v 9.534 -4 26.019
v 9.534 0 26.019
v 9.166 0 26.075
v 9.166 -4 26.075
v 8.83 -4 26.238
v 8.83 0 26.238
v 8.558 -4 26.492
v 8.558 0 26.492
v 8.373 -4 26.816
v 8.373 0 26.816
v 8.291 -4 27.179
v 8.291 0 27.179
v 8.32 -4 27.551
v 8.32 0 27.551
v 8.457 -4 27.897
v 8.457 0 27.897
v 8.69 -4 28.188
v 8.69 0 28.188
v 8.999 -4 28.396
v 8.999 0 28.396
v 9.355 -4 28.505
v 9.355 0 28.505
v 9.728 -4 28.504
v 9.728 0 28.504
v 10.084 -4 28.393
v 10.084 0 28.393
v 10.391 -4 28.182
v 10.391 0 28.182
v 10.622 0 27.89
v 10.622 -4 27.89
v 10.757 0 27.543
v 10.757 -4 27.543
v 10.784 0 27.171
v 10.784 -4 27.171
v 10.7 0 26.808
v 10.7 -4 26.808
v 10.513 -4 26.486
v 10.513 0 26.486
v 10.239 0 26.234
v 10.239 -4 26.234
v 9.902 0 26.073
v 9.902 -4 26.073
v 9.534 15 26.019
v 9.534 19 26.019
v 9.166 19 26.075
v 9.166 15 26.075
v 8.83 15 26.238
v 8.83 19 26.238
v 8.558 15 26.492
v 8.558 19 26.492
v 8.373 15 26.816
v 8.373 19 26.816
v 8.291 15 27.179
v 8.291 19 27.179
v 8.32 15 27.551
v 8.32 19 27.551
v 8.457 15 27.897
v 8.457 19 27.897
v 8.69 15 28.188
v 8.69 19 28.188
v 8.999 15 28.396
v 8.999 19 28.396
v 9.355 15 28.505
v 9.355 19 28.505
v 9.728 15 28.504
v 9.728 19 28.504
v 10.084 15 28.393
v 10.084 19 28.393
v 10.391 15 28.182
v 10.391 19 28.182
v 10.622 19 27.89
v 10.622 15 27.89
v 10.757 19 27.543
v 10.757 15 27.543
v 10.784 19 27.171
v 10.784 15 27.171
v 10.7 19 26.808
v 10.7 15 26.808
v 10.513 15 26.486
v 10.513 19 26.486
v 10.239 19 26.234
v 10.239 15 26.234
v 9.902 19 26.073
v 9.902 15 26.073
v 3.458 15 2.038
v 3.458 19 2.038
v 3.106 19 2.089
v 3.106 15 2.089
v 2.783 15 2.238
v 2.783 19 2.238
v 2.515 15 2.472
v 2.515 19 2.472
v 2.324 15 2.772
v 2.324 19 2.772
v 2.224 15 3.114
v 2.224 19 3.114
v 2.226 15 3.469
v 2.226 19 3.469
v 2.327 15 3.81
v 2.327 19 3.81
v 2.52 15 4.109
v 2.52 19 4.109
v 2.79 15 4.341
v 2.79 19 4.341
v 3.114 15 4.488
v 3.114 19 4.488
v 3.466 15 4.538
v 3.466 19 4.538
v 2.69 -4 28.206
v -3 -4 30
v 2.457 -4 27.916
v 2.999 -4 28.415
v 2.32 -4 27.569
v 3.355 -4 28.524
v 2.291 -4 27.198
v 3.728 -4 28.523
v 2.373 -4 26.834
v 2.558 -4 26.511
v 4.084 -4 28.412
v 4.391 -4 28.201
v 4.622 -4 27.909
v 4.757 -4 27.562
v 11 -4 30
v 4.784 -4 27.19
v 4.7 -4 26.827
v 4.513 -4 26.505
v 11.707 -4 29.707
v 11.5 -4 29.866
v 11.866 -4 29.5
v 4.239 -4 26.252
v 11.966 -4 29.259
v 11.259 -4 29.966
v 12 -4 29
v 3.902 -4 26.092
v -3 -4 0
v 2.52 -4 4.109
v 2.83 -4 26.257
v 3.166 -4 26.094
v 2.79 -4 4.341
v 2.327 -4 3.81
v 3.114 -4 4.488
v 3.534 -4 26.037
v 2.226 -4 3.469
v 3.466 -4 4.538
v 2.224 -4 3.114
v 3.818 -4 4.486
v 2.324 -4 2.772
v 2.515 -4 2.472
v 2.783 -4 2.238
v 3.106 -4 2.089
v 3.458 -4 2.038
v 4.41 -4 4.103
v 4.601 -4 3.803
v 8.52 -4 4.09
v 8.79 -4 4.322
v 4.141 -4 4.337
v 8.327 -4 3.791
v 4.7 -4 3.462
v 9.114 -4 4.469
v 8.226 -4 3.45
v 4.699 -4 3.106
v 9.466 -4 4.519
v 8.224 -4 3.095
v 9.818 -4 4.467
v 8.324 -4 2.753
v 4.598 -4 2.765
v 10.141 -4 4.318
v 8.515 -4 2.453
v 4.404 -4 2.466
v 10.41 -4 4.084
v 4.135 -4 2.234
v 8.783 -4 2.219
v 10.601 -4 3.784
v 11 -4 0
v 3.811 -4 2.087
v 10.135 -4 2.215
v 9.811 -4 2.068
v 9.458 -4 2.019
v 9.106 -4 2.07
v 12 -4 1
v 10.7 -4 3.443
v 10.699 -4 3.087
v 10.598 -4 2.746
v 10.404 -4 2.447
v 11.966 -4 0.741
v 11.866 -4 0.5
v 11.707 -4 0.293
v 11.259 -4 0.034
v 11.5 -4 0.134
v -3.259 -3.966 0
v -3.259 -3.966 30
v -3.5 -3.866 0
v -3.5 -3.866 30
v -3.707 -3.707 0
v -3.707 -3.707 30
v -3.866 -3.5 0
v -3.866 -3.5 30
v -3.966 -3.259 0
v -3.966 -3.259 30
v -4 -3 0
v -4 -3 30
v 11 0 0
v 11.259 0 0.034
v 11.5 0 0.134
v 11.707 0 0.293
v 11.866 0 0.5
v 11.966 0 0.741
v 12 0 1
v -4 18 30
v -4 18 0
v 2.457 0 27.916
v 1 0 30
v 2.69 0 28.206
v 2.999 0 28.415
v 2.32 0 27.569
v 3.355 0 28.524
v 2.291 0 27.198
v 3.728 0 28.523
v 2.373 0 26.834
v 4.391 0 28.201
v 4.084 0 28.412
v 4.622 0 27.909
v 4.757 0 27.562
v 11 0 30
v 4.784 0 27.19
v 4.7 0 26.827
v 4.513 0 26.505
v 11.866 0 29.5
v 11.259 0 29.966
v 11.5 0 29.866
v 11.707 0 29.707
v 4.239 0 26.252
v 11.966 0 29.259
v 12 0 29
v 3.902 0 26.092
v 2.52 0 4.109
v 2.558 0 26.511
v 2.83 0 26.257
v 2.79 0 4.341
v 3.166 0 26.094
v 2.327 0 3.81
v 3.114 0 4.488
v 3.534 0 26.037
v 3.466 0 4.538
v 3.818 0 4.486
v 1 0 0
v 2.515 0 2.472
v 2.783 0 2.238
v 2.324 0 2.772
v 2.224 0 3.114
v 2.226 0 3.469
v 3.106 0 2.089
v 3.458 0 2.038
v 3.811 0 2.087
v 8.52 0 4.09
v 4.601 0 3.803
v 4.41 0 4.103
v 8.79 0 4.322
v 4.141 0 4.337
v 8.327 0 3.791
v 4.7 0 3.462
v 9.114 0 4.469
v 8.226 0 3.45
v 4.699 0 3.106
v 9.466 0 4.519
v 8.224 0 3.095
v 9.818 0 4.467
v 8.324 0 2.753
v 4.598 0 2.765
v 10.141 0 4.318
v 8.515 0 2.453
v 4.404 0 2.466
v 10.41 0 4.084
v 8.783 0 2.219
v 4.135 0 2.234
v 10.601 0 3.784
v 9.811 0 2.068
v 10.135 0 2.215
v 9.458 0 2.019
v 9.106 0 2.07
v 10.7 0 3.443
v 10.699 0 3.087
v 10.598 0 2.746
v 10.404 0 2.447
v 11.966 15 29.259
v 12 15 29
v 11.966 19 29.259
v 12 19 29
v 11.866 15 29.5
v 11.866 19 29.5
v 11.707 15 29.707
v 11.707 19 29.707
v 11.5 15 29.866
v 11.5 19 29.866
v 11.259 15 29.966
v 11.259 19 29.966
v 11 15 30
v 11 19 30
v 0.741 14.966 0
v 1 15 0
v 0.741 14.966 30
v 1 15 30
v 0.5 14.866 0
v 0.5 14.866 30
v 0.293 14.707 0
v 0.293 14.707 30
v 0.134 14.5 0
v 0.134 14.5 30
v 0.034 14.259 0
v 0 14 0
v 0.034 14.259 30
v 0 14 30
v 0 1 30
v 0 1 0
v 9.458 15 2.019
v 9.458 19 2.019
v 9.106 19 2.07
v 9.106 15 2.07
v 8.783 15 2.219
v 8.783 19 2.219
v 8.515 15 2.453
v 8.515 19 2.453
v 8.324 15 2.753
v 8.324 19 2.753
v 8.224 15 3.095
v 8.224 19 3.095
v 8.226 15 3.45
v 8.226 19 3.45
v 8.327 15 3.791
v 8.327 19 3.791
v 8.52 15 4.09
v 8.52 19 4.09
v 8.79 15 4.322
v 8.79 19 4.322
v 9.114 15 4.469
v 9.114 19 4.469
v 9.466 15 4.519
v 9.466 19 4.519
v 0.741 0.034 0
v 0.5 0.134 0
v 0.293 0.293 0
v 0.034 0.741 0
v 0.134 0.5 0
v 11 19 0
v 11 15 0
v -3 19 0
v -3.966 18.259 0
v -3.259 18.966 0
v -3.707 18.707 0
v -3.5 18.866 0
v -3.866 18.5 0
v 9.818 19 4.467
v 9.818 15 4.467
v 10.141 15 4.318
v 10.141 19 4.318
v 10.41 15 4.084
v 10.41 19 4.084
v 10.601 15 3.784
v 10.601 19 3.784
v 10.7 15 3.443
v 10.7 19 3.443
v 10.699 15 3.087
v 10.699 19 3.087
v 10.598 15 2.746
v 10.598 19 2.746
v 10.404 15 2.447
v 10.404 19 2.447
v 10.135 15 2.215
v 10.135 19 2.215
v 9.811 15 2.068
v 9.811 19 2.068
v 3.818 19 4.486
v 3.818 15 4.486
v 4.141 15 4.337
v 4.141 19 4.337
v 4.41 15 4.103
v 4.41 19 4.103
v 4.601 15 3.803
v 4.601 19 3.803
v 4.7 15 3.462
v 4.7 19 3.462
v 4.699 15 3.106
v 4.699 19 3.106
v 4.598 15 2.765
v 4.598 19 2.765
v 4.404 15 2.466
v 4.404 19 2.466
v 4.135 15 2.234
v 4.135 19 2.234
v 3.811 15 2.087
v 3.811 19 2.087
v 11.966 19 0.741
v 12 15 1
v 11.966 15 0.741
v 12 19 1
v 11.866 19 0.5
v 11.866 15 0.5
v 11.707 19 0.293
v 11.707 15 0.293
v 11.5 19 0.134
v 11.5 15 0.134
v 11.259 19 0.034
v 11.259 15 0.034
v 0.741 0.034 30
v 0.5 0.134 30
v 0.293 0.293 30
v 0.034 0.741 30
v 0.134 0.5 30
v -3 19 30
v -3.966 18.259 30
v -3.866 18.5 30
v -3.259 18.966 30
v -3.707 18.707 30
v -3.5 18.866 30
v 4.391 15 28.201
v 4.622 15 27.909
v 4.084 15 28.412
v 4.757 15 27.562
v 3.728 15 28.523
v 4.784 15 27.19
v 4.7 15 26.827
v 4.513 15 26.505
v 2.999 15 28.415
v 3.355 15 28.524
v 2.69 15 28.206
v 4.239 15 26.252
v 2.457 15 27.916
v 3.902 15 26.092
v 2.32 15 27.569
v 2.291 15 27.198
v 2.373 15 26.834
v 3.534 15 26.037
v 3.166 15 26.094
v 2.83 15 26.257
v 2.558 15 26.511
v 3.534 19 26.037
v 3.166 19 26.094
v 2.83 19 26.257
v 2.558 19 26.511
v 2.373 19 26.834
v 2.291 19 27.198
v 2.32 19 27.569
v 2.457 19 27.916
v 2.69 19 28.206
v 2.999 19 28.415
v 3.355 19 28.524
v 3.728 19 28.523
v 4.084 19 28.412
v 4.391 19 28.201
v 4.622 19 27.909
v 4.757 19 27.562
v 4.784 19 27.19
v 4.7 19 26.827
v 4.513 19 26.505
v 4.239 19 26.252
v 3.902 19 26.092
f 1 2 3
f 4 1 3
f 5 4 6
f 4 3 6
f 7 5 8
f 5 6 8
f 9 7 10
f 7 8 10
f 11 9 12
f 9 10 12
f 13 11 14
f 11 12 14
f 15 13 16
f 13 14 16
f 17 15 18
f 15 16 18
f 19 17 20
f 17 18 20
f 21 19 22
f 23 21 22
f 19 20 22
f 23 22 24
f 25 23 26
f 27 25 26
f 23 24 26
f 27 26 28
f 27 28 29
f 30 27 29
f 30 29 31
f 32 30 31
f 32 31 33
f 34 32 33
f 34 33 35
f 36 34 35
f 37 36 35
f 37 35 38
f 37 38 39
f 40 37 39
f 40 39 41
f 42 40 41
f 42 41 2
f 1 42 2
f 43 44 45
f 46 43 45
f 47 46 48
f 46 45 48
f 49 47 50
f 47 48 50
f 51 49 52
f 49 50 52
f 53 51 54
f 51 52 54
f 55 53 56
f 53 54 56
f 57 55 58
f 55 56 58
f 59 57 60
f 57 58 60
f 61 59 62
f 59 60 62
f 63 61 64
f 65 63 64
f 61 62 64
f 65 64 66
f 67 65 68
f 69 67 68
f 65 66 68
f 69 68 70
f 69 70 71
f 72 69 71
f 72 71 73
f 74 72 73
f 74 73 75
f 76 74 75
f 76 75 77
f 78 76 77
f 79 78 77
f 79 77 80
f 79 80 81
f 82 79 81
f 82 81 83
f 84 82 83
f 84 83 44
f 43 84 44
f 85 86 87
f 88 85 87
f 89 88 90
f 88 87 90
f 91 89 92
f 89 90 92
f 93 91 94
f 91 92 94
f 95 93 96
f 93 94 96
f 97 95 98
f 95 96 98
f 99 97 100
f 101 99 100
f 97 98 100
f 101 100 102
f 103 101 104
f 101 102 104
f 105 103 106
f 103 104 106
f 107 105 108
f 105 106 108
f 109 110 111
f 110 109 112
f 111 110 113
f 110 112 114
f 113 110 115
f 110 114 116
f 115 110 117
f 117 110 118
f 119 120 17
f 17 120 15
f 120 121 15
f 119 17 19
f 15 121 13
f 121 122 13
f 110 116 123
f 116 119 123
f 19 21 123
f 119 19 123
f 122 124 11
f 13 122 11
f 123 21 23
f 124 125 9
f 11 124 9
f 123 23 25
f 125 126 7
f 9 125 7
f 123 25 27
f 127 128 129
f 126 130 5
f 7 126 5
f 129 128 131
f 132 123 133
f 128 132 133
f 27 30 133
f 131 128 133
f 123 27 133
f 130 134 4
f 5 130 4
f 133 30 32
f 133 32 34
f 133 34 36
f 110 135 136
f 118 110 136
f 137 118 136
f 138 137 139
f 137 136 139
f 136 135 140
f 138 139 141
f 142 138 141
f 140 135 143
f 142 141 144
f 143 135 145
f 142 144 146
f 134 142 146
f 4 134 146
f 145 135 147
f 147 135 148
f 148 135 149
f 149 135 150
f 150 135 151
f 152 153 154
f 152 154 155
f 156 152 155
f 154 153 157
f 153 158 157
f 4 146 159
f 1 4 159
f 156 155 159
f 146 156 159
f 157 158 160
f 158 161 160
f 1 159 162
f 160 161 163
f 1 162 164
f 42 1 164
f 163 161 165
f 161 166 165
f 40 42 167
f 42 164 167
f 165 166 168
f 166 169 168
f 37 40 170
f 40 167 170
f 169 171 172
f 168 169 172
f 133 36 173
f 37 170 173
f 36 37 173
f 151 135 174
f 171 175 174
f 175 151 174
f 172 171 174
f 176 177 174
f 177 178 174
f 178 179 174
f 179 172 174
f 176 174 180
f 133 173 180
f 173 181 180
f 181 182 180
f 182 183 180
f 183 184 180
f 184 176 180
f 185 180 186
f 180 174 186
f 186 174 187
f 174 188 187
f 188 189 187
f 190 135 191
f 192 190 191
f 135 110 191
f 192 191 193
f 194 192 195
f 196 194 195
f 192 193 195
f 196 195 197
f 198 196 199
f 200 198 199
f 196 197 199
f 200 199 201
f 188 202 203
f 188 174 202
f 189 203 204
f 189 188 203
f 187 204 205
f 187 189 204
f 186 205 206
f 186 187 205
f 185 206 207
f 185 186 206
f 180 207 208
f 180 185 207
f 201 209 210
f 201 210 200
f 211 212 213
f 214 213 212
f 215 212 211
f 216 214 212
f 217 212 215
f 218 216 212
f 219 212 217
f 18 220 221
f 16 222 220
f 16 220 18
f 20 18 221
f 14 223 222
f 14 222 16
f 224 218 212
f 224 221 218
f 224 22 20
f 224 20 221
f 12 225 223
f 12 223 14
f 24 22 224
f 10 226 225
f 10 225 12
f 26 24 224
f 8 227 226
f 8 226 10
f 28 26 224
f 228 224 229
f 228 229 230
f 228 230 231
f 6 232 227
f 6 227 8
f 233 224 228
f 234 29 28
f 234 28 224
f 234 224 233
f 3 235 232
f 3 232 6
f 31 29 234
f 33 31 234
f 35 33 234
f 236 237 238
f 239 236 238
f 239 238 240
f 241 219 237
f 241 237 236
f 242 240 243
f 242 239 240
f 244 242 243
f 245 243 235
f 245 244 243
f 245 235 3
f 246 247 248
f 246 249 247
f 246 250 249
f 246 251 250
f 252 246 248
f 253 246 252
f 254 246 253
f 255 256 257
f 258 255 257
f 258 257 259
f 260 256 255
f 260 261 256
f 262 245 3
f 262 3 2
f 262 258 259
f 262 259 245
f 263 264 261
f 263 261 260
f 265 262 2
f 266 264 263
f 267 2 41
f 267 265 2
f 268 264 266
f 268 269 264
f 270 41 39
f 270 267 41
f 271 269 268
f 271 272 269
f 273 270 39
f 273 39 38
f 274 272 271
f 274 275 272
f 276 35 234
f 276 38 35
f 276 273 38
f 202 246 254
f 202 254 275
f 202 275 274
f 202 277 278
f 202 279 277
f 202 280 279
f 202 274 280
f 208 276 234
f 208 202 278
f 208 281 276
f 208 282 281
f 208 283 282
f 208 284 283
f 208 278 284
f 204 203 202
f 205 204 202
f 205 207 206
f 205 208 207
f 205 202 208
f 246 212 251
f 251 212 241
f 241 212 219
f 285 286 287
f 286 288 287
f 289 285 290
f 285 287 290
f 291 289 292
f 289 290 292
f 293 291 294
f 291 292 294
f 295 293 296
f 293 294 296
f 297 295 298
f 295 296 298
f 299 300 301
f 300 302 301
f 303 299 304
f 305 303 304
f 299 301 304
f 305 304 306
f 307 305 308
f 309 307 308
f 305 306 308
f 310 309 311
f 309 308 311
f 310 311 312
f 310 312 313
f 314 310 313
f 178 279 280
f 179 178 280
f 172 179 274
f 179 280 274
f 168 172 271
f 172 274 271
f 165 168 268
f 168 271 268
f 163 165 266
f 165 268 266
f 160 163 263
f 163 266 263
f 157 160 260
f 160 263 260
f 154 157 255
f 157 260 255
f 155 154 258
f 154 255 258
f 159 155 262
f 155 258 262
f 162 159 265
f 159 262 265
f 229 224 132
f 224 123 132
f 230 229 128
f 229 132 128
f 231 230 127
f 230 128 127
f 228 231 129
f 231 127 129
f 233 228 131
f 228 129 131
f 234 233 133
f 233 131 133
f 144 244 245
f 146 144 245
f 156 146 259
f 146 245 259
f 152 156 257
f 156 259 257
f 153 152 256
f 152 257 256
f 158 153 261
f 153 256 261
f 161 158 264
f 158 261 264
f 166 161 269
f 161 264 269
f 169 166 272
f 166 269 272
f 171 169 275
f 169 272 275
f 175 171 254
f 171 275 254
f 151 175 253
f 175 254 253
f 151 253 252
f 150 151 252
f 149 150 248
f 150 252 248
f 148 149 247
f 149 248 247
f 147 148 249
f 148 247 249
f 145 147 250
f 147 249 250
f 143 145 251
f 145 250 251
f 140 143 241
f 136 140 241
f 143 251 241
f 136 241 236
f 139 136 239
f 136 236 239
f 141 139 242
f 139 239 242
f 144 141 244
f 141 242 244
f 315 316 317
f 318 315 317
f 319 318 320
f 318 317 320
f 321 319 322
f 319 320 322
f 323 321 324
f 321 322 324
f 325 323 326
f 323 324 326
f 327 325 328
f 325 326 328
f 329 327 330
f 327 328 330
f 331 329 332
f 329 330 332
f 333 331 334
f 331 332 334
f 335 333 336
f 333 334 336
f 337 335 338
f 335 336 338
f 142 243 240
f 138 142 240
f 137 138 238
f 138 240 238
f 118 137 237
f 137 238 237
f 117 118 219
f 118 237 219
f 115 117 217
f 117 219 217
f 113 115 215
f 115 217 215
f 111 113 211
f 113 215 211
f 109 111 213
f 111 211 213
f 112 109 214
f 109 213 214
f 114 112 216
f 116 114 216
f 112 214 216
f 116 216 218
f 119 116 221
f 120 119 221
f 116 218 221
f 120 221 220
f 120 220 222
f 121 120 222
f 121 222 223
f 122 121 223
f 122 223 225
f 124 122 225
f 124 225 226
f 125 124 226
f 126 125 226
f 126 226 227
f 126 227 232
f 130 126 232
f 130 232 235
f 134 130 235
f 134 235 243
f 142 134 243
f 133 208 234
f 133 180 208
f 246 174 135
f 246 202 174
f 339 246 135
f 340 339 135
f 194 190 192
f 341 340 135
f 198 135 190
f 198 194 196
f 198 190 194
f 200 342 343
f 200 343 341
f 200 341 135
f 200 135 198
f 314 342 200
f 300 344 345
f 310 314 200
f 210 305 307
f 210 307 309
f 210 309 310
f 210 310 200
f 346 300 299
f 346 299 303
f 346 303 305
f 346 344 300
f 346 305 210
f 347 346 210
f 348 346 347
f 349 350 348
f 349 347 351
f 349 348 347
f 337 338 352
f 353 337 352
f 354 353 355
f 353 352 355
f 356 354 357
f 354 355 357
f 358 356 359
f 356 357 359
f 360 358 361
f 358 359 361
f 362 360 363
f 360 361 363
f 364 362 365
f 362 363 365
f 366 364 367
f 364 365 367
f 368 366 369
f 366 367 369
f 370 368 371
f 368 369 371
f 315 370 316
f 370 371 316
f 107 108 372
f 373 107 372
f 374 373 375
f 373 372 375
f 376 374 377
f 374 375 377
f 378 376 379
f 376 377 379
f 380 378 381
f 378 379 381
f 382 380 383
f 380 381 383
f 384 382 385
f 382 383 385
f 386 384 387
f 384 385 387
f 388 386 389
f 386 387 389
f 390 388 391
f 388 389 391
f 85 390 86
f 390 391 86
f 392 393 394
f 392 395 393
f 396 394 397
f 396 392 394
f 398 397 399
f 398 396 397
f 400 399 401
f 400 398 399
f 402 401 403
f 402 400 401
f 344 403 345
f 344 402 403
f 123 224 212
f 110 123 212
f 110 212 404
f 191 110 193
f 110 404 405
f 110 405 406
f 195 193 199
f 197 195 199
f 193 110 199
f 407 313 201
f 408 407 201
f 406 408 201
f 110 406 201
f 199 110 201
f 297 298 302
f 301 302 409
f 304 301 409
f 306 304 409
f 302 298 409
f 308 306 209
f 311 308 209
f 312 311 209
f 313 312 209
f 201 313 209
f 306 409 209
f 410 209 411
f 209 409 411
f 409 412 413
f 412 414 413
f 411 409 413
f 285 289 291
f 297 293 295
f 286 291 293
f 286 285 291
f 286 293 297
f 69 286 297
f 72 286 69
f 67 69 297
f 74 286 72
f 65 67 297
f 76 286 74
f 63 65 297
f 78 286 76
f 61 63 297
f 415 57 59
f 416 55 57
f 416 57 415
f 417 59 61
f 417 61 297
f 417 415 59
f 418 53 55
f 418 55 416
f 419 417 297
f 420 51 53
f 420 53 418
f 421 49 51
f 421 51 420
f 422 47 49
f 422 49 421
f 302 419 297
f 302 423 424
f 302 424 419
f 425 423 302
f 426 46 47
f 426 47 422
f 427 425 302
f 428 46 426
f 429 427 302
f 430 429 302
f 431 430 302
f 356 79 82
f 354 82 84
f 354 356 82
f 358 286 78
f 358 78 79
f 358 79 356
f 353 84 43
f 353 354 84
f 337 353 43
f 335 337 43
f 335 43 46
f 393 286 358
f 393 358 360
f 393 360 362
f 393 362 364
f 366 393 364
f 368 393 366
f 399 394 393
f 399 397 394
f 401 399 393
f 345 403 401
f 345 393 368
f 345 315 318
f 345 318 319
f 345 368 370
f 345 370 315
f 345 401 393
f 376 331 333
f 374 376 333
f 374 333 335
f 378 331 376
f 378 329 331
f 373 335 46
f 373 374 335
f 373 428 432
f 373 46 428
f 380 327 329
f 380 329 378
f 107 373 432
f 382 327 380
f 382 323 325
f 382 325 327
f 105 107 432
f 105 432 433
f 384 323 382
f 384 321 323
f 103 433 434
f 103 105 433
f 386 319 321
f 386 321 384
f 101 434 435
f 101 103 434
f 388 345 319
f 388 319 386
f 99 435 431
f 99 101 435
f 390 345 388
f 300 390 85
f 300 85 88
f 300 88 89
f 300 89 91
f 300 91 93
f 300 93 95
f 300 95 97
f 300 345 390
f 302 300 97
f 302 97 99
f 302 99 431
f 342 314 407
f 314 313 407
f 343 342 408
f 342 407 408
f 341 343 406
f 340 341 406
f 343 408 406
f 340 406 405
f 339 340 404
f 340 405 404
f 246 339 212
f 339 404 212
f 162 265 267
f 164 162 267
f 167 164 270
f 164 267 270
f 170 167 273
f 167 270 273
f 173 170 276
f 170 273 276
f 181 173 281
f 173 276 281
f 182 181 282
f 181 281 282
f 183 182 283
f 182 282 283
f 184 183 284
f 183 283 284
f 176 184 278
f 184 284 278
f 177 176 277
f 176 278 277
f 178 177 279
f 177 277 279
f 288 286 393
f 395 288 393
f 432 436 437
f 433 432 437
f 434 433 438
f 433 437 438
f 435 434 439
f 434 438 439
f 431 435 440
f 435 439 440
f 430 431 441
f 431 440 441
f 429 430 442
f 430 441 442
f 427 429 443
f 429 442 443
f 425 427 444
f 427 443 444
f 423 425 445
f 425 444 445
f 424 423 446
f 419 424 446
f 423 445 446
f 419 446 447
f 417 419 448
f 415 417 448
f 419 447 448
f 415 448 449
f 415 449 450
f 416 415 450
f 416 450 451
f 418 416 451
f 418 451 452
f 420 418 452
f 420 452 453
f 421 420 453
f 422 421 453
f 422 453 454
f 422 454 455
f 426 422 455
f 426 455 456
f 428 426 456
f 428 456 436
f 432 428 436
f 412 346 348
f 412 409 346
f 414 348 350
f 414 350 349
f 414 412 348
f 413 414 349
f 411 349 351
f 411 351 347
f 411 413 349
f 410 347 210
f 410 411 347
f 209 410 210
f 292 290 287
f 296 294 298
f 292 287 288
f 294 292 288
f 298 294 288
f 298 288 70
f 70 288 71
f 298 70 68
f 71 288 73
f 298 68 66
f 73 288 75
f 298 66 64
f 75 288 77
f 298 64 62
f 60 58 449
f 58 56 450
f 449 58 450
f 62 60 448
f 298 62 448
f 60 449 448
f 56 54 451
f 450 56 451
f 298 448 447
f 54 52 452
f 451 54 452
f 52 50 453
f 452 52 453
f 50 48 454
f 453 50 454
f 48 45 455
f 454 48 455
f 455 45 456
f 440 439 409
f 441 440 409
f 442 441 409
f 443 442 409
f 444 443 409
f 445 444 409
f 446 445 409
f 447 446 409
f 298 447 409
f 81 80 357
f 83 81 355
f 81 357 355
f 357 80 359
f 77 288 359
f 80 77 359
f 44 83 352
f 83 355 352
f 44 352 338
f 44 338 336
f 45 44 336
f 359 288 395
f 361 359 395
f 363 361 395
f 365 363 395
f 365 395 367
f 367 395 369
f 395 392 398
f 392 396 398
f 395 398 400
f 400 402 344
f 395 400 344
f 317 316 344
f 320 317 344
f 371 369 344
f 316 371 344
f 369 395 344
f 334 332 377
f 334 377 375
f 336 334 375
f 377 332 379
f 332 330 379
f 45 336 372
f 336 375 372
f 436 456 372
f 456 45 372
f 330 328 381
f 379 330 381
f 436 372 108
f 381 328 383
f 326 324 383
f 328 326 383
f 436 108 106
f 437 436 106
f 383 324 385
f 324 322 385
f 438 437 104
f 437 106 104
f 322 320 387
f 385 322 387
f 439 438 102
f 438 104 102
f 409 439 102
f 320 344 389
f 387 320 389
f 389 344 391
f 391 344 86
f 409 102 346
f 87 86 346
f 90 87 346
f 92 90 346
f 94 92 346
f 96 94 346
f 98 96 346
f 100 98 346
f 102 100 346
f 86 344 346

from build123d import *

# Parameters (mm, degrees)
SHEET_EXTRUDE_1_1_DEPTH = 30
THICKEN_1_T2            = 4
CUT_EXTRUDE_1_DEPTH     = 30
FILLET_1_R              = 1
FILLET_2_R              = 1


with BuildPart() as body_1:
    # Sheet Extrude 1: a surface, the sketch's curves swept straight by 30 mm
    with BuildLine(Plane.XY, mode=Mode.PRIVATE) as sheet_extrude_1_1_path:
        Line((12, 15), (0, 15))
        Line((0, 15), (0, 0))
        Line((0, 0), (12, 0))
    sheet_extrude_1_1 = Shell.extrude(sheet_extrude_1_1_path.wire(), (0 * SHEET_EXTRUDE_1_1_DEPTH, 0 * SHEET_EXTRUDE_1_1_DEPTH, 1 * SHEET_EXTRUDE_1_1_DEPTH))
    add(Solid.thicken(sheet_extrude_1_1, -THICKEN_1_T2))

    # 草图2 → 切除-拉伸1 (cut)
    with BuildSketch(Plane(origin=(0, 19, 0), x_dir=(1, 0, 0), z_dir=(0, 1, 0))):
        with BuildLine():
            ThreePointArc((3.46625552, -4.537501621), (4.712321266, -3.283579711), (3.458399356, -2.037513964))
            ThreePointArc((3.458399356, -2.037513964), (2.21233361, -3.291435874), (3.46625552, -4.537501621))
        make_face()
        with BuildLine():
            ThreePointArc((9.466225894, -4.518646828), (10.712291641, -3.264724918), (9.458369731, -2.018659172))
            ThreePointArc((9.458369731, -2.018659172), (8.212303985, -3.272581082), (9.466225894, -4.518646828))
        make_face()
        with BuildLine():
            ThreePointArc((3.541674691, -28.537383119), (4.787740437, -27.283461209), (3.533818527, -26.037395463))
            ThreePointArc((3.533818527, -26.037395463), (2.287752781, -27.291317373), (3.541674691, -28.537383119))
        make_face()
        with BuildLine():
            ThreePointArc((9.541645066, -28.518528326), (10.787710812, -27.264606416), (9.533788902, -26.01854067))
            ThreePointArc((9.533788902, -26.01854067), (8.287723156, -27.27246258), (9.541645066, -28.518528326))
        make_face()
    extrude(amount=-CUT_EXTRUDE_1_DEPTH, mode=Mode.SUBTRACT)

    # 圆角1
    fillet_1_edges = [body_1.edges().sort_by_distance(p)[0] for p in [
        (12, -2, 30),
        (12, 17, 30),
        (12, 17, 0),
        (12, -2, 0),
        (0, 15, 15),
        (0, 0, 15),
    ]]
    fillet(fillet_1_edges, radius=FILLET_1_R)

    # 圆角2
    fillet_2_edges = [body_1.edges().sort_by_distance(p)[0] for p in [
        (-4, -4, 15),
        (-4, 19, 15),
    ]]
    fillet(fillet_2_edges, radius=FILLET_2_R)


solid = body_1.part
